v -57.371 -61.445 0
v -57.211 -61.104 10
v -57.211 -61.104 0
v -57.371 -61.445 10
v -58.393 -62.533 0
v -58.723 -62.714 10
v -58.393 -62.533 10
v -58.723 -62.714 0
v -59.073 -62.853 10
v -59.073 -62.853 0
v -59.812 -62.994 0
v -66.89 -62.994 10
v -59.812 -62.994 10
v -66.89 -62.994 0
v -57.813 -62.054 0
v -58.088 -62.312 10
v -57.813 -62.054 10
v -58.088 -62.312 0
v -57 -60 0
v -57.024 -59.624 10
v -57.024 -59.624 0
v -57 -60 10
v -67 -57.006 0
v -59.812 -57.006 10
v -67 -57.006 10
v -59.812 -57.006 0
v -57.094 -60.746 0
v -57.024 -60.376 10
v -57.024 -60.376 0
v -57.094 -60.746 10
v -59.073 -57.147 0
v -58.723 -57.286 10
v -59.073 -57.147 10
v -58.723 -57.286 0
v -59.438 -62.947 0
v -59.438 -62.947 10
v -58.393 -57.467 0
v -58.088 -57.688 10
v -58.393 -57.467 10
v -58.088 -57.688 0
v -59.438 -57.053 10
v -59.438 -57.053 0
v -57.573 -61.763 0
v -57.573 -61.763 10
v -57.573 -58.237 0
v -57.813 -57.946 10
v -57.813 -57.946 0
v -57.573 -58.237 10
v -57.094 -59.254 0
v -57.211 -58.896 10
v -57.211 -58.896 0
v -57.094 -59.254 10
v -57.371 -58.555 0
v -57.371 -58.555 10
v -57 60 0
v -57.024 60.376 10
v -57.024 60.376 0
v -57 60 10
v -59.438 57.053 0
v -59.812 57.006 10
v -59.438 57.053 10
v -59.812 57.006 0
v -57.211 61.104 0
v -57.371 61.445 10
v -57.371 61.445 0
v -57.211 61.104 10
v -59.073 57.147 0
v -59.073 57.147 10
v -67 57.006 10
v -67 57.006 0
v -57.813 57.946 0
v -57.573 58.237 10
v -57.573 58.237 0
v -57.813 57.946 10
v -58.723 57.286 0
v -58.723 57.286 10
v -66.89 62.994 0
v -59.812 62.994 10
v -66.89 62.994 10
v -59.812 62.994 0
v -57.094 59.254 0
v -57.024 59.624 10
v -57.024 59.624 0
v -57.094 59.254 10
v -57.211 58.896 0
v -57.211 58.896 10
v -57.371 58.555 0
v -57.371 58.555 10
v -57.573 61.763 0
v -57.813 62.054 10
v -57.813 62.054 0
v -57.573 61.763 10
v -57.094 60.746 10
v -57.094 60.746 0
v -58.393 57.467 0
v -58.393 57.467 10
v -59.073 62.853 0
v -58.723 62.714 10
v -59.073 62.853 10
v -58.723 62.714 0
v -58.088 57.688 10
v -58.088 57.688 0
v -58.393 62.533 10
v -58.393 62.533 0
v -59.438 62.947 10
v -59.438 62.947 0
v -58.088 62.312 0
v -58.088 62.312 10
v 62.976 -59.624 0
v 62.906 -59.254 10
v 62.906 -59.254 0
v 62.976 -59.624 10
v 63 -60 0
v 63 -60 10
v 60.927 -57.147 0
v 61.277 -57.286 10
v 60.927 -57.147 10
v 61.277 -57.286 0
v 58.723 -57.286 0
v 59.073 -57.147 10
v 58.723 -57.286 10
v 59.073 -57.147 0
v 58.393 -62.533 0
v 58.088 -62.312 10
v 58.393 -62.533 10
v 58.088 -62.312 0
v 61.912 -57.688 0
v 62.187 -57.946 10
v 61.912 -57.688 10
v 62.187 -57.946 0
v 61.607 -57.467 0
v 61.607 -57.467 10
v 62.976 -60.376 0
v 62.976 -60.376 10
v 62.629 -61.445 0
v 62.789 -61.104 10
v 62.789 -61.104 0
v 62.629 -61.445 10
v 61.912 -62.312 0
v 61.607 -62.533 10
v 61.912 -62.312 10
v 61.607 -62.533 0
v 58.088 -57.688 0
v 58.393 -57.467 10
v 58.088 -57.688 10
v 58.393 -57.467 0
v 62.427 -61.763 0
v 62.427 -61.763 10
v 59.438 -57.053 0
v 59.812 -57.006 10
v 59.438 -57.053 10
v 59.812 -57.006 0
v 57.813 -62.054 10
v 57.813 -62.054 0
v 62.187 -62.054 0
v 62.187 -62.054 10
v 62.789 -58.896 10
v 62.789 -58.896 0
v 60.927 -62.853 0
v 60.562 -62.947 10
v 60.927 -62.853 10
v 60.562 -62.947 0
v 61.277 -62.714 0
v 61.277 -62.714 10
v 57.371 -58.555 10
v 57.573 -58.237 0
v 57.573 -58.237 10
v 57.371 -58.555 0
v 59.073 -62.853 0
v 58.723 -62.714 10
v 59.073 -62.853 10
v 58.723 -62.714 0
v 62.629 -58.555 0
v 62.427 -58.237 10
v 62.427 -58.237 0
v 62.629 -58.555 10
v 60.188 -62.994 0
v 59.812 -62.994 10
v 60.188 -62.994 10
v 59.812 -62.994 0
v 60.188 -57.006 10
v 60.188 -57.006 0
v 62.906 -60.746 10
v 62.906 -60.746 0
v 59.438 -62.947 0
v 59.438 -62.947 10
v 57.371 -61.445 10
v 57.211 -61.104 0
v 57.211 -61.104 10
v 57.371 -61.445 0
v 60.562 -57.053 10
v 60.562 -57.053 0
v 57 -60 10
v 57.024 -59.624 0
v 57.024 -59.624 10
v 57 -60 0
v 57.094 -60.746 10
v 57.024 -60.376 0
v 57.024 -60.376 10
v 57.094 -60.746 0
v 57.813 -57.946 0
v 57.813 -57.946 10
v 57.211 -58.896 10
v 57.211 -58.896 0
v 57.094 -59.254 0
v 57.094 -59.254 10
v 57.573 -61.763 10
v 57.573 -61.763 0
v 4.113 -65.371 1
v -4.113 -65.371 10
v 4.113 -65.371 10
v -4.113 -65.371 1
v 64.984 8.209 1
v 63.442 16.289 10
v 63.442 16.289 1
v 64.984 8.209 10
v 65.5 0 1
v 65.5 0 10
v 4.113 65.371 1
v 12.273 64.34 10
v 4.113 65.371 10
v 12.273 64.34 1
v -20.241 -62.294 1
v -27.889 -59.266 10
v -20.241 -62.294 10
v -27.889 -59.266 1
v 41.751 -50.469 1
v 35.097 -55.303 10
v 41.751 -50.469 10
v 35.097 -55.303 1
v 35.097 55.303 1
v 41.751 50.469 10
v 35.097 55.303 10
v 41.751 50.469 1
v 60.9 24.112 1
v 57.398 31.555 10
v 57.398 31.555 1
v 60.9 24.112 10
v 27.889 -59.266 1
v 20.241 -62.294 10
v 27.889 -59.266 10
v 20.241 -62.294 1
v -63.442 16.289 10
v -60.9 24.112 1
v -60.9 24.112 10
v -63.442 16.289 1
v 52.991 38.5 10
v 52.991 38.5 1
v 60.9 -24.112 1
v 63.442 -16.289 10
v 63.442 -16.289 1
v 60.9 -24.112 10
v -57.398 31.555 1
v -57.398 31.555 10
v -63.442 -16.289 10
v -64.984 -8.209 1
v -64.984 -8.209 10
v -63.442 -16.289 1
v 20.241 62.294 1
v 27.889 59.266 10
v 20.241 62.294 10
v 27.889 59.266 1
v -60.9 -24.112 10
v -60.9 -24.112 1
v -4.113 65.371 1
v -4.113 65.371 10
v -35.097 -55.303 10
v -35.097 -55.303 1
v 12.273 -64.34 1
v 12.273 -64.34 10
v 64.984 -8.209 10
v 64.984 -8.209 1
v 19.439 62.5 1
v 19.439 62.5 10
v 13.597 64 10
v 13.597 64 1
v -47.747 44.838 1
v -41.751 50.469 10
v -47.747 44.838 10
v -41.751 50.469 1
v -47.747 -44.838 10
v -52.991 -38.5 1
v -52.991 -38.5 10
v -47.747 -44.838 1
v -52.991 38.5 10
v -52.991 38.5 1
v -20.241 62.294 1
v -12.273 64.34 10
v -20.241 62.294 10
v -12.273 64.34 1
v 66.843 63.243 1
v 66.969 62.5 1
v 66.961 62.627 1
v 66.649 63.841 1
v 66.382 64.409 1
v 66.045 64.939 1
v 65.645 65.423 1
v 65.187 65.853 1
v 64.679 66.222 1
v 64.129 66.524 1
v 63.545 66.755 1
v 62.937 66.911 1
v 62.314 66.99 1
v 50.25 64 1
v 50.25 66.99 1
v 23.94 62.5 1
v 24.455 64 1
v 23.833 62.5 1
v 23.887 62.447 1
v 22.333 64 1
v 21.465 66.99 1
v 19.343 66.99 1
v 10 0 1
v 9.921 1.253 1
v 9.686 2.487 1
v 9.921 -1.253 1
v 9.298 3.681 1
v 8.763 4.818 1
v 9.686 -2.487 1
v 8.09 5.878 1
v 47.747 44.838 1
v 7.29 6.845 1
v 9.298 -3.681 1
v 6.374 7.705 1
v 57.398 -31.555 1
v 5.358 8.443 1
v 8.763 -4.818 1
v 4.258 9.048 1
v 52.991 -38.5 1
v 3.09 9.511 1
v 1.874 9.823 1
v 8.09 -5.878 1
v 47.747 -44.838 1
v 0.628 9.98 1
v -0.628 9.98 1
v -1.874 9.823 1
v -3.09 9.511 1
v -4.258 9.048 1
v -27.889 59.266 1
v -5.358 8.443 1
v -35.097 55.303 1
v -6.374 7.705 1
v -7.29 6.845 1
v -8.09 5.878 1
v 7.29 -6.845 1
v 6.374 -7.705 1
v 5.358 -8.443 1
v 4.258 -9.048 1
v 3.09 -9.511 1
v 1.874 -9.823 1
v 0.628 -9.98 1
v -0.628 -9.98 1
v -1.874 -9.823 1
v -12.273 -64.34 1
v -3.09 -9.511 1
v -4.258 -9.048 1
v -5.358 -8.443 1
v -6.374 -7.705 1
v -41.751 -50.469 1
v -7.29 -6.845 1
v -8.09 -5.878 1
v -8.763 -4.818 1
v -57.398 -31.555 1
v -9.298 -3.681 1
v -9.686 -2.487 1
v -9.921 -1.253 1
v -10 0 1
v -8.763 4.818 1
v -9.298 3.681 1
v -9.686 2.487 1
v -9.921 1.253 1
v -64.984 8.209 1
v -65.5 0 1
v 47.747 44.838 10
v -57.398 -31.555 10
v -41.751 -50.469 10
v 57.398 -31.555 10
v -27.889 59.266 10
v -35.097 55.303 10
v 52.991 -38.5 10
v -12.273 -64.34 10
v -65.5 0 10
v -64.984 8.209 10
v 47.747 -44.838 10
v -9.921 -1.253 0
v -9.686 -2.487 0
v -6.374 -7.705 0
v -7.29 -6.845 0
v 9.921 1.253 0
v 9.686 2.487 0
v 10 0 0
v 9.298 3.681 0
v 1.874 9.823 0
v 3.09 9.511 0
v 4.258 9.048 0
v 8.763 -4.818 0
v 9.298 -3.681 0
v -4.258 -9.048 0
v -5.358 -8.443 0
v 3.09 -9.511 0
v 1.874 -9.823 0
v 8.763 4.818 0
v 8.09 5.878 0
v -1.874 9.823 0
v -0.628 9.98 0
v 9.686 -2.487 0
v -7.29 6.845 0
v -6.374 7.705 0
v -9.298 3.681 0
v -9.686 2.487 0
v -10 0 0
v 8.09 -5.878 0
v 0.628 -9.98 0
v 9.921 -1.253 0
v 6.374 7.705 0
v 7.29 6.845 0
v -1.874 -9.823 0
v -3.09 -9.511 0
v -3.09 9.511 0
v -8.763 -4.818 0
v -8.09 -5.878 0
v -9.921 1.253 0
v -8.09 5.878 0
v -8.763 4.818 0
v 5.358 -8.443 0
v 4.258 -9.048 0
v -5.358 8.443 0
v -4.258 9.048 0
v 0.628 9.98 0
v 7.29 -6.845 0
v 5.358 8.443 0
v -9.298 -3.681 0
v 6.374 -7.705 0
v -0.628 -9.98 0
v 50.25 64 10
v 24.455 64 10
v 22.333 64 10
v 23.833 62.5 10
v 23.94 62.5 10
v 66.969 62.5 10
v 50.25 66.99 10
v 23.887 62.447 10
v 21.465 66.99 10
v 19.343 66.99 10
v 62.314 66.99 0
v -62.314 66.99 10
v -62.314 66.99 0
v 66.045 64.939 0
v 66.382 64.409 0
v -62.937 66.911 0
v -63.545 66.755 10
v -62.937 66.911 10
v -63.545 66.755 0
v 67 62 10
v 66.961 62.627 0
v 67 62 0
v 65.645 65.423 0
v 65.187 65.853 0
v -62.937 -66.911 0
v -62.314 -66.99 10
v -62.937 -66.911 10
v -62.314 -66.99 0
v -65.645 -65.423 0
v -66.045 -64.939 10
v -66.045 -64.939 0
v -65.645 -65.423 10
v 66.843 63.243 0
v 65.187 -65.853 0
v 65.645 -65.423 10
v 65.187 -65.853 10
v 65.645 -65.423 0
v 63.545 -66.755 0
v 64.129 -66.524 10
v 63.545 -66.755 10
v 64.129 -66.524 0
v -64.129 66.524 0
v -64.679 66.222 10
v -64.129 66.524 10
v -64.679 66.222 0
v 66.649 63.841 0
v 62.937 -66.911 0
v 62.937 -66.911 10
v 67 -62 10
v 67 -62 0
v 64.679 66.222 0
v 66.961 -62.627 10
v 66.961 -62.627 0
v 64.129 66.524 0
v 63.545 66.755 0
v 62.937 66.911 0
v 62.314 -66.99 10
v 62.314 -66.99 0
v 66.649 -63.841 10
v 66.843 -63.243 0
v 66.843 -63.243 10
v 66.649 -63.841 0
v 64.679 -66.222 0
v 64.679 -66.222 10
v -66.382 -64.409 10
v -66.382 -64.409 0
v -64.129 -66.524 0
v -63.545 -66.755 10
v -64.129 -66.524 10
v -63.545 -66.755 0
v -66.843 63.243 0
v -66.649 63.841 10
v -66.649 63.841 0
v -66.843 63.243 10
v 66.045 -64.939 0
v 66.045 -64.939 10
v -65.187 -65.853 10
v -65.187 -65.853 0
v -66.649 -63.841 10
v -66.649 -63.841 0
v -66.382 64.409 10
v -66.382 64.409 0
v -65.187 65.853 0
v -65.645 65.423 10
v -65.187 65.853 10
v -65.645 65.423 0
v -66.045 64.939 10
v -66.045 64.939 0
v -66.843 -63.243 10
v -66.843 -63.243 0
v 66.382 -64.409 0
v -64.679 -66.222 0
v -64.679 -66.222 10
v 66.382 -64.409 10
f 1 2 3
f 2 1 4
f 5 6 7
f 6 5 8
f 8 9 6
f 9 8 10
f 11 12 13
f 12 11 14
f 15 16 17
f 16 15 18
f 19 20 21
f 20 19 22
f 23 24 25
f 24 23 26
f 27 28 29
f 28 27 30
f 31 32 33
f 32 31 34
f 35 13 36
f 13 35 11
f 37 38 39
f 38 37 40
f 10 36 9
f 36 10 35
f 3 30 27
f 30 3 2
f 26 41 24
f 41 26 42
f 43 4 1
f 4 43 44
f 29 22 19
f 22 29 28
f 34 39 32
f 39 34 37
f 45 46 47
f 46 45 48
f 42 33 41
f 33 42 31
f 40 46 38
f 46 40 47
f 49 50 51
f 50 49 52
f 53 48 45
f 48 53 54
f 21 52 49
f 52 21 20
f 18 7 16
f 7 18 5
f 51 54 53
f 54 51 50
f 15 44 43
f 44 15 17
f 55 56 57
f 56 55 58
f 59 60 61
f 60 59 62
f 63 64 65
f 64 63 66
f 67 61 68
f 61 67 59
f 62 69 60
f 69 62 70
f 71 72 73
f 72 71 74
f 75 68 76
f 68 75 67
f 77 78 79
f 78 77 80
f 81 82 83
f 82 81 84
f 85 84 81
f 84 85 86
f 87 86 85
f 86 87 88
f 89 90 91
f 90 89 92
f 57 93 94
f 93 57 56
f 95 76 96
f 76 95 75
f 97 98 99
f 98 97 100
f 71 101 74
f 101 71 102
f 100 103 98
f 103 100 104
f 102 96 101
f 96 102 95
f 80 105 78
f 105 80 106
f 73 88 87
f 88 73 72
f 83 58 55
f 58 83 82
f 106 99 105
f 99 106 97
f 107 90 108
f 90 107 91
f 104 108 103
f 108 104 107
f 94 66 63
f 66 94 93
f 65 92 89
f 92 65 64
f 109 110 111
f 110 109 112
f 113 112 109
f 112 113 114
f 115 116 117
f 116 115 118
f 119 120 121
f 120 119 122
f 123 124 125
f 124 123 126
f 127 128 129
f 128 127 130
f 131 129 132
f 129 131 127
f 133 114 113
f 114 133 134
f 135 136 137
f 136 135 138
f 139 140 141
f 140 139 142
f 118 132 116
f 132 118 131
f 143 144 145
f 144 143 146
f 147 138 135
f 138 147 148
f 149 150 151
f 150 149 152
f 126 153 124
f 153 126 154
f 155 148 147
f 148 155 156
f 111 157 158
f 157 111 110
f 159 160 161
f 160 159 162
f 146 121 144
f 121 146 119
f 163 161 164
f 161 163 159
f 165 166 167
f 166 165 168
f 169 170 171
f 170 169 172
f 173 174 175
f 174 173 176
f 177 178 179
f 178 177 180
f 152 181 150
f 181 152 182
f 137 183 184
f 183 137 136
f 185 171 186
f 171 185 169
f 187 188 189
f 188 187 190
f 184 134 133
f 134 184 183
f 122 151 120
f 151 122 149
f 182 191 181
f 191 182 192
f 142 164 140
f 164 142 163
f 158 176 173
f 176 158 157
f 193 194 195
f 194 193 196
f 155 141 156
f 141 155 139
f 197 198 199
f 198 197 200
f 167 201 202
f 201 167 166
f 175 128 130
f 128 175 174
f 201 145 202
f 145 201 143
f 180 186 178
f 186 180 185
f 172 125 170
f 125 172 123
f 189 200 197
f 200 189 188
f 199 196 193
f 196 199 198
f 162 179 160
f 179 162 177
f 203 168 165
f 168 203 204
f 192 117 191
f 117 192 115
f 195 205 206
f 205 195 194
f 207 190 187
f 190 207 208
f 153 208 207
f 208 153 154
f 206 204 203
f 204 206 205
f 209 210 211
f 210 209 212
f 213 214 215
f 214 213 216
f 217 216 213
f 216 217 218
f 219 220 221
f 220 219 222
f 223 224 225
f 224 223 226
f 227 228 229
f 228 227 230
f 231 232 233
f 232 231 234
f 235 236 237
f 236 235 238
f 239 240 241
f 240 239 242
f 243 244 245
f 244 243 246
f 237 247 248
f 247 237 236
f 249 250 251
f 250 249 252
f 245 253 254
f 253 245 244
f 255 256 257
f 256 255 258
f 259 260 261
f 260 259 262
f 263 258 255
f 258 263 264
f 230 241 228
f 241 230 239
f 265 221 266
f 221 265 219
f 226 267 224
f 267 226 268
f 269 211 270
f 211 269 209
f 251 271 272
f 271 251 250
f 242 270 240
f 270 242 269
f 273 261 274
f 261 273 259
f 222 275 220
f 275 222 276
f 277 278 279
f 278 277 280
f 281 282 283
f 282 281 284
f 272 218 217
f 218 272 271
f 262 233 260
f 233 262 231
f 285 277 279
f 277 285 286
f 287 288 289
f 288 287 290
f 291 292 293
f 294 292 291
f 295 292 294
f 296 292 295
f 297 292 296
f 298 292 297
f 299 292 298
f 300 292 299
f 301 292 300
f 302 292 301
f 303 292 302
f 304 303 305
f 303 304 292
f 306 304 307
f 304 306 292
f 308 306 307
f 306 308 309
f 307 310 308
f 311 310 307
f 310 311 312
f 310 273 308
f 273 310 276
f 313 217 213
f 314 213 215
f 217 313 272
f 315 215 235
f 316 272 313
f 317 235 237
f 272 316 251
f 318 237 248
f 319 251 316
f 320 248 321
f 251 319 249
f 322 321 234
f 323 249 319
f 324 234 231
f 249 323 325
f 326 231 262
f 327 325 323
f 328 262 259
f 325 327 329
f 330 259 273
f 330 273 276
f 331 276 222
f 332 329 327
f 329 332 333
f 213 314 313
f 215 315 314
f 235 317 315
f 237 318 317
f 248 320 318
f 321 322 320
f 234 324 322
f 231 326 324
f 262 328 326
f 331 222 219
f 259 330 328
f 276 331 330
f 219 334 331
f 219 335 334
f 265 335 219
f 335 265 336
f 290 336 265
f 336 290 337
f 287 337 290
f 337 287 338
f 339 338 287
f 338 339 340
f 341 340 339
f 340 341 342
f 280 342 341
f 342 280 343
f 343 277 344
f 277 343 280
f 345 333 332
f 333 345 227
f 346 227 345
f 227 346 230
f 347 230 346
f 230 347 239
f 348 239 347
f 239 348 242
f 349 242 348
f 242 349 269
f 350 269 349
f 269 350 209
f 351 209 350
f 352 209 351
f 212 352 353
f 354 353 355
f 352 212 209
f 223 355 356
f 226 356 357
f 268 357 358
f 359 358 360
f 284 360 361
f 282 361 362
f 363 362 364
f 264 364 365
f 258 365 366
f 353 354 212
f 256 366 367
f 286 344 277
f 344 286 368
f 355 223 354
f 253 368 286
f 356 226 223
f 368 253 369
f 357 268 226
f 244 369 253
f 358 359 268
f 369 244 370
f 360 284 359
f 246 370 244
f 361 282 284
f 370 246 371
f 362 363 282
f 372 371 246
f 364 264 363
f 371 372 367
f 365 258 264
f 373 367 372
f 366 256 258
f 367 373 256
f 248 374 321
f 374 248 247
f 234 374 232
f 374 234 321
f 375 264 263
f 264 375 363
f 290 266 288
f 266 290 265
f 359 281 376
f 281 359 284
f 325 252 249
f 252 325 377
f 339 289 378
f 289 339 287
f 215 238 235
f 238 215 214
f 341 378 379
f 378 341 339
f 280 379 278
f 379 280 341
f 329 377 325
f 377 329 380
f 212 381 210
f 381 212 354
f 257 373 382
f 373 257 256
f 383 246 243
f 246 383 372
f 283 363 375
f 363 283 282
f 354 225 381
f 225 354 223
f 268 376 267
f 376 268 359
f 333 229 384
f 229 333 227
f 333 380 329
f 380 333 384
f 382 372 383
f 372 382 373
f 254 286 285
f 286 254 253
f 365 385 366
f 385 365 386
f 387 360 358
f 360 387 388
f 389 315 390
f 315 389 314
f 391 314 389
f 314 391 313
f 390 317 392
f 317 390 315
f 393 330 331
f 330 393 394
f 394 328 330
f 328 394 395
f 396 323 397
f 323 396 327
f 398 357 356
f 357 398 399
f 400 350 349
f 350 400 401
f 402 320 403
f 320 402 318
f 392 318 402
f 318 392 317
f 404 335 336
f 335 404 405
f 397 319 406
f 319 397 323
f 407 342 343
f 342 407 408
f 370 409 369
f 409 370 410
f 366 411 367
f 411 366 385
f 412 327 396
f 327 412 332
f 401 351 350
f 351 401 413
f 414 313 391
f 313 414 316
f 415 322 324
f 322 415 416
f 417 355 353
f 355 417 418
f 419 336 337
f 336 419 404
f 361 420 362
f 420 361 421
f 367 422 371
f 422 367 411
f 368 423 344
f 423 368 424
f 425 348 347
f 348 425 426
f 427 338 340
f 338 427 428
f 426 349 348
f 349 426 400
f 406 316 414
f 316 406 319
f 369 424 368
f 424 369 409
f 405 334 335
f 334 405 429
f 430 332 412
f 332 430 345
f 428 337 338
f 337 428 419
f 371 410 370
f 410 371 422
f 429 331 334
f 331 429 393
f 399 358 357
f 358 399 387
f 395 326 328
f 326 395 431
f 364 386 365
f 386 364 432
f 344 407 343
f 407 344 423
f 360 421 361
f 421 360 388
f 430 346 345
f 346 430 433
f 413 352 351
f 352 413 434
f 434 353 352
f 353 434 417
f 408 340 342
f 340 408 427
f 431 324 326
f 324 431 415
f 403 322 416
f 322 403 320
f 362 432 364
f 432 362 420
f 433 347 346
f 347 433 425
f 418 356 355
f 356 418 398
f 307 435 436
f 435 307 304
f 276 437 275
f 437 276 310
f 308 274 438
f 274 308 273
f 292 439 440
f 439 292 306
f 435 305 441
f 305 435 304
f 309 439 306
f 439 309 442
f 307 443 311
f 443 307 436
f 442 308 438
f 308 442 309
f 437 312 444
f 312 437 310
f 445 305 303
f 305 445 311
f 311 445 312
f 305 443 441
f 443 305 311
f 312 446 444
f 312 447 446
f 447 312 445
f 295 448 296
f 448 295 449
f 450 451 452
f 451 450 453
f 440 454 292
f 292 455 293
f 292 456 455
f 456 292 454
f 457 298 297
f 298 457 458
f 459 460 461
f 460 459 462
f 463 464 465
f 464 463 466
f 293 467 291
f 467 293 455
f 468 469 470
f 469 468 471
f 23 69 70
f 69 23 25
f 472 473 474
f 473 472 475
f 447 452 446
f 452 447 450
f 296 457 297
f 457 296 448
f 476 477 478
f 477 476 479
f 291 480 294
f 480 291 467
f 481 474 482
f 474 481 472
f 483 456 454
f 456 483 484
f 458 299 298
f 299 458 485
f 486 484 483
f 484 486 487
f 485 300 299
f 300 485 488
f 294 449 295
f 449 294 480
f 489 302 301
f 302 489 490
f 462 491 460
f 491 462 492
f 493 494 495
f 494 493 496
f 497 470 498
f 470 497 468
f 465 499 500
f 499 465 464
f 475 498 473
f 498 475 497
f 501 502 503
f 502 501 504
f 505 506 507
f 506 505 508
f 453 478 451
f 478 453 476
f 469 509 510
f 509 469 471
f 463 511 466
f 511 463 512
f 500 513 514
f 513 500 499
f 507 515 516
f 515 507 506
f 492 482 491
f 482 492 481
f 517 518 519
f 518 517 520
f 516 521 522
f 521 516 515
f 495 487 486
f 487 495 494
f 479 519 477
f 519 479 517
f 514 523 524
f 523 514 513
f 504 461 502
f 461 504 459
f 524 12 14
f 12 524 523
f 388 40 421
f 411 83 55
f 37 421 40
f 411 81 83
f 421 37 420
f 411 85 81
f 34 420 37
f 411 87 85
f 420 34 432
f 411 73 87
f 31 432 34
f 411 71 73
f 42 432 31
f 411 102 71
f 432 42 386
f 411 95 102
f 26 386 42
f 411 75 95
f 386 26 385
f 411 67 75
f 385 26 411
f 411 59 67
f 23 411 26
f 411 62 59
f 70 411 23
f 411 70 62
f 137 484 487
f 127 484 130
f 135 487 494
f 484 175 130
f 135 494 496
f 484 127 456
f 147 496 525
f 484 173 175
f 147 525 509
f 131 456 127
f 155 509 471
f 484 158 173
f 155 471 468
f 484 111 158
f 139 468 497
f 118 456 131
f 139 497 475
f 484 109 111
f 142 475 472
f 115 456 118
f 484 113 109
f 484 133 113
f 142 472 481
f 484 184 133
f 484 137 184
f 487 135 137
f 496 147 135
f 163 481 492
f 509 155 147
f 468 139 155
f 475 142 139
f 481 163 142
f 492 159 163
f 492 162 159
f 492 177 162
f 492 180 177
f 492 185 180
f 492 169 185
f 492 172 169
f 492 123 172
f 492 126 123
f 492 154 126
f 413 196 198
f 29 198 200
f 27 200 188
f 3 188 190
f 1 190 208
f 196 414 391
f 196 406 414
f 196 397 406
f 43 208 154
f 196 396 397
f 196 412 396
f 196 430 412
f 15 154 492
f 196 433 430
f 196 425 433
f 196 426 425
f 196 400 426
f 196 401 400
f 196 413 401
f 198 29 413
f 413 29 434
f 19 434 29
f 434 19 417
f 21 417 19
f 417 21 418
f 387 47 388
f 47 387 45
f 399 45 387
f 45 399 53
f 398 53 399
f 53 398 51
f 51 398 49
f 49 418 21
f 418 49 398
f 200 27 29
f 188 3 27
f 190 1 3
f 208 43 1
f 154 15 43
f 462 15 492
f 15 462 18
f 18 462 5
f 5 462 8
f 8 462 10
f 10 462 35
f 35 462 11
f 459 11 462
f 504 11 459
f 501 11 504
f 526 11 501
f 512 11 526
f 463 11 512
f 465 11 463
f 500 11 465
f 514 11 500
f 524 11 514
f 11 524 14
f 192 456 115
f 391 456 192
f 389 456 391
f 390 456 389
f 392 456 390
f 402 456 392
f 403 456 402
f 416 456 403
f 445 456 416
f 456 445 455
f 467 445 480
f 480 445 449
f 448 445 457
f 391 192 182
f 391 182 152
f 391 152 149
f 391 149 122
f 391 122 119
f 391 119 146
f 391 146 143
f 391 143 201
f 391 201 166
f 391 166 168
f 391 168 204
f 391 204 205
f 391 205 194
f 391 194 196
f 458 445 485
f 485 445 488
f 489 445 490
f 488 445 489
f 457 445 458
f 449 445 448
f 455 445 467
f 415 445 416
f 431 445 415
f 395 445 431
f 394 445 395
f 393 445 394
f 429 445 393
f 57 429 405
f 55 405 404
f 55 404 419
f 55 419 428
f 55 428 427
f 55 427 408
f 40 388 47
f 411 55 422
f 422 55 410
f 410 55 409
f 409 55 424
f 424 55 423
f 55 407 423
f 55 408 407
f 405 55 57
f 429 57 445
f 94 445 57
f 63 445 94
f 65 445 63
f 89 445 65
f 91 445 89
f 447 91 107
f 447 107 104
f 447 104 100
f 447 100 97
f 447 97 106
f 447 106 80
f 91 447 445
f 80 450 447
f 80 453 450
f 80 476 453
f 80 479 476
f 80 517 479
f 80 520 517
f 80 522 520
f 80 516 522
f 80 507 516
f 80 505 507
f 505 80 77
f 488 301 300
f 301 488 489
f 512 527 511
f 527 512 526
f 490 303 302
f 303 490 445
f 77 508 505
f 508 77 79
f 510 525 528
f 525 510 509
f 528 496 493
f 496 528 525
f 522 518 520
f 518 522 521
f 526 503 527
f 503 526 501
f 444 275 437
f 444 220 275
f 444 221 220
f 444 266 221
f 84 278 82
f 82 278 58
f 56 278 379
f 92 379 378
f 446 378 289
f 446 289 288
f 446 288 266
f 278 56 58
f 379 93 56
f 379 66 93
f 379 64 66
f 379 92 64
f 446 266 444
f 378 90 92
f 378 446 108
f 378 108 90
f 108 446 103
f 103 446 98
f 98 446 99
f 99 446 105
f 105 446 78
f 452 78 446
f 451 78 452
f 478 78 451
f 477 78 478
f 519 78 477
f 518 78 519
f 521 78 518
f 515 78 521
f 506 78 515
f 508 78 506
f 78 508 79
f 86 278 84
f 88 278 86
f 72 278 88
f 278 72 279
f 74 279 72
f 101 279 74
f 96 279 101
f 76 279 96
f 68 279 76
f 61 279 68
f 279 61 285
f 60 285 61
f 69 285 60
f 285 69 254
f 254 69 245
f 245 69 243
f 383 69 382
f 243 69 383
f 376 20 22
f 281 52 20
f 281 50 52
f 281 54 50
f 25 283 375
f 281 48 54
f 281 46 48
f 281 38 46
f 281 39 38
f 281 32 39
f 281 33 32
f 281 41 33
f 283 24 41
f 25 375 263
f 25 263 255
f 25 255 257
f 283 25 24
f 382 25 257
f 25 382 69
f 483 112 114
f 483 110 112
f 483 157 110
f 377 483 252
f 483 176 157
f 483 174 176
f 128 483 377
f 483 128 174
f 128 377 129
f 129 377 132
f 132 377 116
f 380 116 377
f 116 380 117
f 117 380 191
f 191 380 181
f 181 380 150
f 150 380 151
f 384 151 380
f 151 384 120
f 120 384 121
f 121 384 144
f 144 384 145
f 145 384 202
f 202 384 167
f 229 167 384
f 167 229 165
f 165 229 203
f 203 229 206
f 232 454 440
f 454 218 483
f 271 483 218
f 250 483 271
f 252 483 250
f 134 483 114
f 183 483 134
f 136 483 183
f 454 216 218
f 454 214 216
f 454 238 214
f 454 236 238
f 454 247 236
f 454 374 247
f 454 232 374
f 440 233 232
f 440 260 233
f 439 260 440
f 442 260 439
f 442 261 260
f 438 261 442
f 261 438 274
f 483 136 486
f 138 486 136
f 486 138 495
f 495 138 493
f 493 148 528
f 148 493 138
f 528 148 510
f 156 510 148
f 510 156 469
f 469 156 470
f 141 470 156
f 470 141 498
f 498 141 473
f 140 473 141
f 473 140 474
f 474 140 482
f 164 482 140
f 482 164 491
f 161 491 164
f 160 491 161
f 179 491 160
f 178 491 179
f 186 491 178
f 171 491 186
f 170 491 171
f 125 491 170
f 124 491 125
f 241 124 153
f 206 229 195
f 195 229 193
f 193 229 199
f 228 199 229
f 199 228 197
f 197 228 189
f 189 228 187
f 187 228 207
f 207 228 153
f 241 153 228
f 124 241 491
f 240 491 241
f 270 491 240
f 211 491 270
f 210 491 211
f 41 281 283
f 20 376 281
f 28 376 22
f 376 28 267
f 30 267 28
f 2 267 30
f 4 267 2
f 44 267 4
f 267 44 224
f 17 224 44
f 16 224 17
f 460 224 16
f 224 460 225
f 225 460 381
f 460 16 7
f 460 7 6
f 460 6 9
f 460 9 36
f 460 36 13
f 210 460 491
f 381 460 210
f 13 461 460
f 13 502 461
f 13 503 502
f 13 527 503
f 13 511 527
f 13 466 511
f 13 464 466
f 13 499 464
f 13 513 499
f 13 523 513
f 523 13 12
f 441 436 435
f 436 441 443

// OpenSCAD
$fn = 50;


difference() {
	union() {
		translate(v = [0, 0, 0]) {
			rotate(a = [0, 0, 0]) {
				hull() {
					translate(v = [-62.0000000000, 62.0000000000, 0]) {
						rotate(a = [0, 0, 0]) {
							translate(v = [0, 0, 0]) {
								rotate(a = [0, 0, 0]) {
									cylinder(h = 10, r = 5);
								}
							}
						}
					}
					translate(v = [62.0000000000, 62.0000000000, 0]) {
						rotate(a = [0, 0, 0]) {
							translate(v = [0, 0, 0]) {
								rotate(a = [0, 0, 0]) {
									cylinder(h = 10, r = 5);
								}
							}
						}
					}
					translate(v = [-62.0000000000, -62.0000000000, 0]) {
						rotate(a = [0, 0, 0]) {
							translate(v = [0, 0, 0]) {
								rotate(a = [0, 0, 0]) {
									cylinder(h = 10, r = 5);
								}
							}
						}
					}
					translate(v = [62.0000000000, -62.0000000000, 0]) {
						rotate(a = [0, 0, 0]) {
							translate(v = [0, 0, 0]) {
								rotate(a = [0, 0, 0]) {
									cylinder(h = 10, r = 5);
								}
							}
						}
					}
				}
			}
		}
	}
	union() {
		translate(v = [-67.5000000000, -60.0000000000, -125]) {
			rotate(a = [0, 0, 0]) {
				hull() {
					translate(v = [7.5000000000, 0, 0]) {
						rotate(a = [0, 0, 0]) {
							translate(v = [0, 0, 0]) {
								rotate(a = [0, 0, 0]) {
									cylinder(h = 250, r = 3.0000000000);
								}
							}
						}
					}
					translate(v = [-7.5000000000, 0, 0]) {
						rotate(a = [0, 0, 0]) {
							translate(v = [0, 0, 0]) {
								rotate(a = [0, 0, 0]) {
									cylinder(h = 250, r = 3.0000000000);
								}
							}
						}
					}
				}
			}
		}
		translate(v = [-67.5000000000, 60.0000000000, -125]) {
			rotate(a = [0, 0, 0]) {
				hull() {
					translate(v = [7.5000000000, 0, 0]) {
						rotate(a = [0, 0, 0]) {
							translate(v = [0, 0, 0]) {
								rotate(a = [0, 0, 0]) {
									cylinder(h = 250, r = 3.0000000000);
								}
							}
						}
					}
					translate(v = [-7.5000000000, 0, 0]) {
						rotate(a = [0, 0, 0]) {
							translate(v = [0, 0, 0]) {
								rotate(a = [0, 0, 0]) {
									cylinder(h = 250, r = 3.0000000000);
								}
							}
						}
					}
				}
			}
		}
		translate(v = [60.0000000000, -60.0000000000, -125.0000000000]) {
			rotate(a = [0, 0, 0]) {
				cylinder(h = 250, r = 3.0000000000);
			}
		}
		translate(v = [0, 0, 1.0000000000]) {
			rotate(a = [0, 0, 0]) {
				cylinder(h = 12, r = 65.5000000000);
			}
		}
		translate(v = [0, 0, -5.0000000000]) {
			rotate(a = [0, 0, 0]) {
				cylinder(h = 10, r = 10.0000000000);
			}
		}
		translate(v = [0.0000000000, 62.5000000000, 1]) {
			rotate(a = [0, 0, 0]) {
				cube(size = [67.0000000000, 1.5000000000, 12]);
			}
		}
		translate(v = [50.2500000000, 62.5000000000, 1]) {
			rotate(a = [0, 0, 0]) {
				cube(size = [16.7500000000, 4.5000000000, 12]);
			}
		}
		translate(v = [18.5833333333, 67.7500000000, 1]) {
			rotate(a = [0, 0, -45]) {
				cube(size = [7.5000000000, 1.5000000000, 12]);
			}
		}
	}
}
